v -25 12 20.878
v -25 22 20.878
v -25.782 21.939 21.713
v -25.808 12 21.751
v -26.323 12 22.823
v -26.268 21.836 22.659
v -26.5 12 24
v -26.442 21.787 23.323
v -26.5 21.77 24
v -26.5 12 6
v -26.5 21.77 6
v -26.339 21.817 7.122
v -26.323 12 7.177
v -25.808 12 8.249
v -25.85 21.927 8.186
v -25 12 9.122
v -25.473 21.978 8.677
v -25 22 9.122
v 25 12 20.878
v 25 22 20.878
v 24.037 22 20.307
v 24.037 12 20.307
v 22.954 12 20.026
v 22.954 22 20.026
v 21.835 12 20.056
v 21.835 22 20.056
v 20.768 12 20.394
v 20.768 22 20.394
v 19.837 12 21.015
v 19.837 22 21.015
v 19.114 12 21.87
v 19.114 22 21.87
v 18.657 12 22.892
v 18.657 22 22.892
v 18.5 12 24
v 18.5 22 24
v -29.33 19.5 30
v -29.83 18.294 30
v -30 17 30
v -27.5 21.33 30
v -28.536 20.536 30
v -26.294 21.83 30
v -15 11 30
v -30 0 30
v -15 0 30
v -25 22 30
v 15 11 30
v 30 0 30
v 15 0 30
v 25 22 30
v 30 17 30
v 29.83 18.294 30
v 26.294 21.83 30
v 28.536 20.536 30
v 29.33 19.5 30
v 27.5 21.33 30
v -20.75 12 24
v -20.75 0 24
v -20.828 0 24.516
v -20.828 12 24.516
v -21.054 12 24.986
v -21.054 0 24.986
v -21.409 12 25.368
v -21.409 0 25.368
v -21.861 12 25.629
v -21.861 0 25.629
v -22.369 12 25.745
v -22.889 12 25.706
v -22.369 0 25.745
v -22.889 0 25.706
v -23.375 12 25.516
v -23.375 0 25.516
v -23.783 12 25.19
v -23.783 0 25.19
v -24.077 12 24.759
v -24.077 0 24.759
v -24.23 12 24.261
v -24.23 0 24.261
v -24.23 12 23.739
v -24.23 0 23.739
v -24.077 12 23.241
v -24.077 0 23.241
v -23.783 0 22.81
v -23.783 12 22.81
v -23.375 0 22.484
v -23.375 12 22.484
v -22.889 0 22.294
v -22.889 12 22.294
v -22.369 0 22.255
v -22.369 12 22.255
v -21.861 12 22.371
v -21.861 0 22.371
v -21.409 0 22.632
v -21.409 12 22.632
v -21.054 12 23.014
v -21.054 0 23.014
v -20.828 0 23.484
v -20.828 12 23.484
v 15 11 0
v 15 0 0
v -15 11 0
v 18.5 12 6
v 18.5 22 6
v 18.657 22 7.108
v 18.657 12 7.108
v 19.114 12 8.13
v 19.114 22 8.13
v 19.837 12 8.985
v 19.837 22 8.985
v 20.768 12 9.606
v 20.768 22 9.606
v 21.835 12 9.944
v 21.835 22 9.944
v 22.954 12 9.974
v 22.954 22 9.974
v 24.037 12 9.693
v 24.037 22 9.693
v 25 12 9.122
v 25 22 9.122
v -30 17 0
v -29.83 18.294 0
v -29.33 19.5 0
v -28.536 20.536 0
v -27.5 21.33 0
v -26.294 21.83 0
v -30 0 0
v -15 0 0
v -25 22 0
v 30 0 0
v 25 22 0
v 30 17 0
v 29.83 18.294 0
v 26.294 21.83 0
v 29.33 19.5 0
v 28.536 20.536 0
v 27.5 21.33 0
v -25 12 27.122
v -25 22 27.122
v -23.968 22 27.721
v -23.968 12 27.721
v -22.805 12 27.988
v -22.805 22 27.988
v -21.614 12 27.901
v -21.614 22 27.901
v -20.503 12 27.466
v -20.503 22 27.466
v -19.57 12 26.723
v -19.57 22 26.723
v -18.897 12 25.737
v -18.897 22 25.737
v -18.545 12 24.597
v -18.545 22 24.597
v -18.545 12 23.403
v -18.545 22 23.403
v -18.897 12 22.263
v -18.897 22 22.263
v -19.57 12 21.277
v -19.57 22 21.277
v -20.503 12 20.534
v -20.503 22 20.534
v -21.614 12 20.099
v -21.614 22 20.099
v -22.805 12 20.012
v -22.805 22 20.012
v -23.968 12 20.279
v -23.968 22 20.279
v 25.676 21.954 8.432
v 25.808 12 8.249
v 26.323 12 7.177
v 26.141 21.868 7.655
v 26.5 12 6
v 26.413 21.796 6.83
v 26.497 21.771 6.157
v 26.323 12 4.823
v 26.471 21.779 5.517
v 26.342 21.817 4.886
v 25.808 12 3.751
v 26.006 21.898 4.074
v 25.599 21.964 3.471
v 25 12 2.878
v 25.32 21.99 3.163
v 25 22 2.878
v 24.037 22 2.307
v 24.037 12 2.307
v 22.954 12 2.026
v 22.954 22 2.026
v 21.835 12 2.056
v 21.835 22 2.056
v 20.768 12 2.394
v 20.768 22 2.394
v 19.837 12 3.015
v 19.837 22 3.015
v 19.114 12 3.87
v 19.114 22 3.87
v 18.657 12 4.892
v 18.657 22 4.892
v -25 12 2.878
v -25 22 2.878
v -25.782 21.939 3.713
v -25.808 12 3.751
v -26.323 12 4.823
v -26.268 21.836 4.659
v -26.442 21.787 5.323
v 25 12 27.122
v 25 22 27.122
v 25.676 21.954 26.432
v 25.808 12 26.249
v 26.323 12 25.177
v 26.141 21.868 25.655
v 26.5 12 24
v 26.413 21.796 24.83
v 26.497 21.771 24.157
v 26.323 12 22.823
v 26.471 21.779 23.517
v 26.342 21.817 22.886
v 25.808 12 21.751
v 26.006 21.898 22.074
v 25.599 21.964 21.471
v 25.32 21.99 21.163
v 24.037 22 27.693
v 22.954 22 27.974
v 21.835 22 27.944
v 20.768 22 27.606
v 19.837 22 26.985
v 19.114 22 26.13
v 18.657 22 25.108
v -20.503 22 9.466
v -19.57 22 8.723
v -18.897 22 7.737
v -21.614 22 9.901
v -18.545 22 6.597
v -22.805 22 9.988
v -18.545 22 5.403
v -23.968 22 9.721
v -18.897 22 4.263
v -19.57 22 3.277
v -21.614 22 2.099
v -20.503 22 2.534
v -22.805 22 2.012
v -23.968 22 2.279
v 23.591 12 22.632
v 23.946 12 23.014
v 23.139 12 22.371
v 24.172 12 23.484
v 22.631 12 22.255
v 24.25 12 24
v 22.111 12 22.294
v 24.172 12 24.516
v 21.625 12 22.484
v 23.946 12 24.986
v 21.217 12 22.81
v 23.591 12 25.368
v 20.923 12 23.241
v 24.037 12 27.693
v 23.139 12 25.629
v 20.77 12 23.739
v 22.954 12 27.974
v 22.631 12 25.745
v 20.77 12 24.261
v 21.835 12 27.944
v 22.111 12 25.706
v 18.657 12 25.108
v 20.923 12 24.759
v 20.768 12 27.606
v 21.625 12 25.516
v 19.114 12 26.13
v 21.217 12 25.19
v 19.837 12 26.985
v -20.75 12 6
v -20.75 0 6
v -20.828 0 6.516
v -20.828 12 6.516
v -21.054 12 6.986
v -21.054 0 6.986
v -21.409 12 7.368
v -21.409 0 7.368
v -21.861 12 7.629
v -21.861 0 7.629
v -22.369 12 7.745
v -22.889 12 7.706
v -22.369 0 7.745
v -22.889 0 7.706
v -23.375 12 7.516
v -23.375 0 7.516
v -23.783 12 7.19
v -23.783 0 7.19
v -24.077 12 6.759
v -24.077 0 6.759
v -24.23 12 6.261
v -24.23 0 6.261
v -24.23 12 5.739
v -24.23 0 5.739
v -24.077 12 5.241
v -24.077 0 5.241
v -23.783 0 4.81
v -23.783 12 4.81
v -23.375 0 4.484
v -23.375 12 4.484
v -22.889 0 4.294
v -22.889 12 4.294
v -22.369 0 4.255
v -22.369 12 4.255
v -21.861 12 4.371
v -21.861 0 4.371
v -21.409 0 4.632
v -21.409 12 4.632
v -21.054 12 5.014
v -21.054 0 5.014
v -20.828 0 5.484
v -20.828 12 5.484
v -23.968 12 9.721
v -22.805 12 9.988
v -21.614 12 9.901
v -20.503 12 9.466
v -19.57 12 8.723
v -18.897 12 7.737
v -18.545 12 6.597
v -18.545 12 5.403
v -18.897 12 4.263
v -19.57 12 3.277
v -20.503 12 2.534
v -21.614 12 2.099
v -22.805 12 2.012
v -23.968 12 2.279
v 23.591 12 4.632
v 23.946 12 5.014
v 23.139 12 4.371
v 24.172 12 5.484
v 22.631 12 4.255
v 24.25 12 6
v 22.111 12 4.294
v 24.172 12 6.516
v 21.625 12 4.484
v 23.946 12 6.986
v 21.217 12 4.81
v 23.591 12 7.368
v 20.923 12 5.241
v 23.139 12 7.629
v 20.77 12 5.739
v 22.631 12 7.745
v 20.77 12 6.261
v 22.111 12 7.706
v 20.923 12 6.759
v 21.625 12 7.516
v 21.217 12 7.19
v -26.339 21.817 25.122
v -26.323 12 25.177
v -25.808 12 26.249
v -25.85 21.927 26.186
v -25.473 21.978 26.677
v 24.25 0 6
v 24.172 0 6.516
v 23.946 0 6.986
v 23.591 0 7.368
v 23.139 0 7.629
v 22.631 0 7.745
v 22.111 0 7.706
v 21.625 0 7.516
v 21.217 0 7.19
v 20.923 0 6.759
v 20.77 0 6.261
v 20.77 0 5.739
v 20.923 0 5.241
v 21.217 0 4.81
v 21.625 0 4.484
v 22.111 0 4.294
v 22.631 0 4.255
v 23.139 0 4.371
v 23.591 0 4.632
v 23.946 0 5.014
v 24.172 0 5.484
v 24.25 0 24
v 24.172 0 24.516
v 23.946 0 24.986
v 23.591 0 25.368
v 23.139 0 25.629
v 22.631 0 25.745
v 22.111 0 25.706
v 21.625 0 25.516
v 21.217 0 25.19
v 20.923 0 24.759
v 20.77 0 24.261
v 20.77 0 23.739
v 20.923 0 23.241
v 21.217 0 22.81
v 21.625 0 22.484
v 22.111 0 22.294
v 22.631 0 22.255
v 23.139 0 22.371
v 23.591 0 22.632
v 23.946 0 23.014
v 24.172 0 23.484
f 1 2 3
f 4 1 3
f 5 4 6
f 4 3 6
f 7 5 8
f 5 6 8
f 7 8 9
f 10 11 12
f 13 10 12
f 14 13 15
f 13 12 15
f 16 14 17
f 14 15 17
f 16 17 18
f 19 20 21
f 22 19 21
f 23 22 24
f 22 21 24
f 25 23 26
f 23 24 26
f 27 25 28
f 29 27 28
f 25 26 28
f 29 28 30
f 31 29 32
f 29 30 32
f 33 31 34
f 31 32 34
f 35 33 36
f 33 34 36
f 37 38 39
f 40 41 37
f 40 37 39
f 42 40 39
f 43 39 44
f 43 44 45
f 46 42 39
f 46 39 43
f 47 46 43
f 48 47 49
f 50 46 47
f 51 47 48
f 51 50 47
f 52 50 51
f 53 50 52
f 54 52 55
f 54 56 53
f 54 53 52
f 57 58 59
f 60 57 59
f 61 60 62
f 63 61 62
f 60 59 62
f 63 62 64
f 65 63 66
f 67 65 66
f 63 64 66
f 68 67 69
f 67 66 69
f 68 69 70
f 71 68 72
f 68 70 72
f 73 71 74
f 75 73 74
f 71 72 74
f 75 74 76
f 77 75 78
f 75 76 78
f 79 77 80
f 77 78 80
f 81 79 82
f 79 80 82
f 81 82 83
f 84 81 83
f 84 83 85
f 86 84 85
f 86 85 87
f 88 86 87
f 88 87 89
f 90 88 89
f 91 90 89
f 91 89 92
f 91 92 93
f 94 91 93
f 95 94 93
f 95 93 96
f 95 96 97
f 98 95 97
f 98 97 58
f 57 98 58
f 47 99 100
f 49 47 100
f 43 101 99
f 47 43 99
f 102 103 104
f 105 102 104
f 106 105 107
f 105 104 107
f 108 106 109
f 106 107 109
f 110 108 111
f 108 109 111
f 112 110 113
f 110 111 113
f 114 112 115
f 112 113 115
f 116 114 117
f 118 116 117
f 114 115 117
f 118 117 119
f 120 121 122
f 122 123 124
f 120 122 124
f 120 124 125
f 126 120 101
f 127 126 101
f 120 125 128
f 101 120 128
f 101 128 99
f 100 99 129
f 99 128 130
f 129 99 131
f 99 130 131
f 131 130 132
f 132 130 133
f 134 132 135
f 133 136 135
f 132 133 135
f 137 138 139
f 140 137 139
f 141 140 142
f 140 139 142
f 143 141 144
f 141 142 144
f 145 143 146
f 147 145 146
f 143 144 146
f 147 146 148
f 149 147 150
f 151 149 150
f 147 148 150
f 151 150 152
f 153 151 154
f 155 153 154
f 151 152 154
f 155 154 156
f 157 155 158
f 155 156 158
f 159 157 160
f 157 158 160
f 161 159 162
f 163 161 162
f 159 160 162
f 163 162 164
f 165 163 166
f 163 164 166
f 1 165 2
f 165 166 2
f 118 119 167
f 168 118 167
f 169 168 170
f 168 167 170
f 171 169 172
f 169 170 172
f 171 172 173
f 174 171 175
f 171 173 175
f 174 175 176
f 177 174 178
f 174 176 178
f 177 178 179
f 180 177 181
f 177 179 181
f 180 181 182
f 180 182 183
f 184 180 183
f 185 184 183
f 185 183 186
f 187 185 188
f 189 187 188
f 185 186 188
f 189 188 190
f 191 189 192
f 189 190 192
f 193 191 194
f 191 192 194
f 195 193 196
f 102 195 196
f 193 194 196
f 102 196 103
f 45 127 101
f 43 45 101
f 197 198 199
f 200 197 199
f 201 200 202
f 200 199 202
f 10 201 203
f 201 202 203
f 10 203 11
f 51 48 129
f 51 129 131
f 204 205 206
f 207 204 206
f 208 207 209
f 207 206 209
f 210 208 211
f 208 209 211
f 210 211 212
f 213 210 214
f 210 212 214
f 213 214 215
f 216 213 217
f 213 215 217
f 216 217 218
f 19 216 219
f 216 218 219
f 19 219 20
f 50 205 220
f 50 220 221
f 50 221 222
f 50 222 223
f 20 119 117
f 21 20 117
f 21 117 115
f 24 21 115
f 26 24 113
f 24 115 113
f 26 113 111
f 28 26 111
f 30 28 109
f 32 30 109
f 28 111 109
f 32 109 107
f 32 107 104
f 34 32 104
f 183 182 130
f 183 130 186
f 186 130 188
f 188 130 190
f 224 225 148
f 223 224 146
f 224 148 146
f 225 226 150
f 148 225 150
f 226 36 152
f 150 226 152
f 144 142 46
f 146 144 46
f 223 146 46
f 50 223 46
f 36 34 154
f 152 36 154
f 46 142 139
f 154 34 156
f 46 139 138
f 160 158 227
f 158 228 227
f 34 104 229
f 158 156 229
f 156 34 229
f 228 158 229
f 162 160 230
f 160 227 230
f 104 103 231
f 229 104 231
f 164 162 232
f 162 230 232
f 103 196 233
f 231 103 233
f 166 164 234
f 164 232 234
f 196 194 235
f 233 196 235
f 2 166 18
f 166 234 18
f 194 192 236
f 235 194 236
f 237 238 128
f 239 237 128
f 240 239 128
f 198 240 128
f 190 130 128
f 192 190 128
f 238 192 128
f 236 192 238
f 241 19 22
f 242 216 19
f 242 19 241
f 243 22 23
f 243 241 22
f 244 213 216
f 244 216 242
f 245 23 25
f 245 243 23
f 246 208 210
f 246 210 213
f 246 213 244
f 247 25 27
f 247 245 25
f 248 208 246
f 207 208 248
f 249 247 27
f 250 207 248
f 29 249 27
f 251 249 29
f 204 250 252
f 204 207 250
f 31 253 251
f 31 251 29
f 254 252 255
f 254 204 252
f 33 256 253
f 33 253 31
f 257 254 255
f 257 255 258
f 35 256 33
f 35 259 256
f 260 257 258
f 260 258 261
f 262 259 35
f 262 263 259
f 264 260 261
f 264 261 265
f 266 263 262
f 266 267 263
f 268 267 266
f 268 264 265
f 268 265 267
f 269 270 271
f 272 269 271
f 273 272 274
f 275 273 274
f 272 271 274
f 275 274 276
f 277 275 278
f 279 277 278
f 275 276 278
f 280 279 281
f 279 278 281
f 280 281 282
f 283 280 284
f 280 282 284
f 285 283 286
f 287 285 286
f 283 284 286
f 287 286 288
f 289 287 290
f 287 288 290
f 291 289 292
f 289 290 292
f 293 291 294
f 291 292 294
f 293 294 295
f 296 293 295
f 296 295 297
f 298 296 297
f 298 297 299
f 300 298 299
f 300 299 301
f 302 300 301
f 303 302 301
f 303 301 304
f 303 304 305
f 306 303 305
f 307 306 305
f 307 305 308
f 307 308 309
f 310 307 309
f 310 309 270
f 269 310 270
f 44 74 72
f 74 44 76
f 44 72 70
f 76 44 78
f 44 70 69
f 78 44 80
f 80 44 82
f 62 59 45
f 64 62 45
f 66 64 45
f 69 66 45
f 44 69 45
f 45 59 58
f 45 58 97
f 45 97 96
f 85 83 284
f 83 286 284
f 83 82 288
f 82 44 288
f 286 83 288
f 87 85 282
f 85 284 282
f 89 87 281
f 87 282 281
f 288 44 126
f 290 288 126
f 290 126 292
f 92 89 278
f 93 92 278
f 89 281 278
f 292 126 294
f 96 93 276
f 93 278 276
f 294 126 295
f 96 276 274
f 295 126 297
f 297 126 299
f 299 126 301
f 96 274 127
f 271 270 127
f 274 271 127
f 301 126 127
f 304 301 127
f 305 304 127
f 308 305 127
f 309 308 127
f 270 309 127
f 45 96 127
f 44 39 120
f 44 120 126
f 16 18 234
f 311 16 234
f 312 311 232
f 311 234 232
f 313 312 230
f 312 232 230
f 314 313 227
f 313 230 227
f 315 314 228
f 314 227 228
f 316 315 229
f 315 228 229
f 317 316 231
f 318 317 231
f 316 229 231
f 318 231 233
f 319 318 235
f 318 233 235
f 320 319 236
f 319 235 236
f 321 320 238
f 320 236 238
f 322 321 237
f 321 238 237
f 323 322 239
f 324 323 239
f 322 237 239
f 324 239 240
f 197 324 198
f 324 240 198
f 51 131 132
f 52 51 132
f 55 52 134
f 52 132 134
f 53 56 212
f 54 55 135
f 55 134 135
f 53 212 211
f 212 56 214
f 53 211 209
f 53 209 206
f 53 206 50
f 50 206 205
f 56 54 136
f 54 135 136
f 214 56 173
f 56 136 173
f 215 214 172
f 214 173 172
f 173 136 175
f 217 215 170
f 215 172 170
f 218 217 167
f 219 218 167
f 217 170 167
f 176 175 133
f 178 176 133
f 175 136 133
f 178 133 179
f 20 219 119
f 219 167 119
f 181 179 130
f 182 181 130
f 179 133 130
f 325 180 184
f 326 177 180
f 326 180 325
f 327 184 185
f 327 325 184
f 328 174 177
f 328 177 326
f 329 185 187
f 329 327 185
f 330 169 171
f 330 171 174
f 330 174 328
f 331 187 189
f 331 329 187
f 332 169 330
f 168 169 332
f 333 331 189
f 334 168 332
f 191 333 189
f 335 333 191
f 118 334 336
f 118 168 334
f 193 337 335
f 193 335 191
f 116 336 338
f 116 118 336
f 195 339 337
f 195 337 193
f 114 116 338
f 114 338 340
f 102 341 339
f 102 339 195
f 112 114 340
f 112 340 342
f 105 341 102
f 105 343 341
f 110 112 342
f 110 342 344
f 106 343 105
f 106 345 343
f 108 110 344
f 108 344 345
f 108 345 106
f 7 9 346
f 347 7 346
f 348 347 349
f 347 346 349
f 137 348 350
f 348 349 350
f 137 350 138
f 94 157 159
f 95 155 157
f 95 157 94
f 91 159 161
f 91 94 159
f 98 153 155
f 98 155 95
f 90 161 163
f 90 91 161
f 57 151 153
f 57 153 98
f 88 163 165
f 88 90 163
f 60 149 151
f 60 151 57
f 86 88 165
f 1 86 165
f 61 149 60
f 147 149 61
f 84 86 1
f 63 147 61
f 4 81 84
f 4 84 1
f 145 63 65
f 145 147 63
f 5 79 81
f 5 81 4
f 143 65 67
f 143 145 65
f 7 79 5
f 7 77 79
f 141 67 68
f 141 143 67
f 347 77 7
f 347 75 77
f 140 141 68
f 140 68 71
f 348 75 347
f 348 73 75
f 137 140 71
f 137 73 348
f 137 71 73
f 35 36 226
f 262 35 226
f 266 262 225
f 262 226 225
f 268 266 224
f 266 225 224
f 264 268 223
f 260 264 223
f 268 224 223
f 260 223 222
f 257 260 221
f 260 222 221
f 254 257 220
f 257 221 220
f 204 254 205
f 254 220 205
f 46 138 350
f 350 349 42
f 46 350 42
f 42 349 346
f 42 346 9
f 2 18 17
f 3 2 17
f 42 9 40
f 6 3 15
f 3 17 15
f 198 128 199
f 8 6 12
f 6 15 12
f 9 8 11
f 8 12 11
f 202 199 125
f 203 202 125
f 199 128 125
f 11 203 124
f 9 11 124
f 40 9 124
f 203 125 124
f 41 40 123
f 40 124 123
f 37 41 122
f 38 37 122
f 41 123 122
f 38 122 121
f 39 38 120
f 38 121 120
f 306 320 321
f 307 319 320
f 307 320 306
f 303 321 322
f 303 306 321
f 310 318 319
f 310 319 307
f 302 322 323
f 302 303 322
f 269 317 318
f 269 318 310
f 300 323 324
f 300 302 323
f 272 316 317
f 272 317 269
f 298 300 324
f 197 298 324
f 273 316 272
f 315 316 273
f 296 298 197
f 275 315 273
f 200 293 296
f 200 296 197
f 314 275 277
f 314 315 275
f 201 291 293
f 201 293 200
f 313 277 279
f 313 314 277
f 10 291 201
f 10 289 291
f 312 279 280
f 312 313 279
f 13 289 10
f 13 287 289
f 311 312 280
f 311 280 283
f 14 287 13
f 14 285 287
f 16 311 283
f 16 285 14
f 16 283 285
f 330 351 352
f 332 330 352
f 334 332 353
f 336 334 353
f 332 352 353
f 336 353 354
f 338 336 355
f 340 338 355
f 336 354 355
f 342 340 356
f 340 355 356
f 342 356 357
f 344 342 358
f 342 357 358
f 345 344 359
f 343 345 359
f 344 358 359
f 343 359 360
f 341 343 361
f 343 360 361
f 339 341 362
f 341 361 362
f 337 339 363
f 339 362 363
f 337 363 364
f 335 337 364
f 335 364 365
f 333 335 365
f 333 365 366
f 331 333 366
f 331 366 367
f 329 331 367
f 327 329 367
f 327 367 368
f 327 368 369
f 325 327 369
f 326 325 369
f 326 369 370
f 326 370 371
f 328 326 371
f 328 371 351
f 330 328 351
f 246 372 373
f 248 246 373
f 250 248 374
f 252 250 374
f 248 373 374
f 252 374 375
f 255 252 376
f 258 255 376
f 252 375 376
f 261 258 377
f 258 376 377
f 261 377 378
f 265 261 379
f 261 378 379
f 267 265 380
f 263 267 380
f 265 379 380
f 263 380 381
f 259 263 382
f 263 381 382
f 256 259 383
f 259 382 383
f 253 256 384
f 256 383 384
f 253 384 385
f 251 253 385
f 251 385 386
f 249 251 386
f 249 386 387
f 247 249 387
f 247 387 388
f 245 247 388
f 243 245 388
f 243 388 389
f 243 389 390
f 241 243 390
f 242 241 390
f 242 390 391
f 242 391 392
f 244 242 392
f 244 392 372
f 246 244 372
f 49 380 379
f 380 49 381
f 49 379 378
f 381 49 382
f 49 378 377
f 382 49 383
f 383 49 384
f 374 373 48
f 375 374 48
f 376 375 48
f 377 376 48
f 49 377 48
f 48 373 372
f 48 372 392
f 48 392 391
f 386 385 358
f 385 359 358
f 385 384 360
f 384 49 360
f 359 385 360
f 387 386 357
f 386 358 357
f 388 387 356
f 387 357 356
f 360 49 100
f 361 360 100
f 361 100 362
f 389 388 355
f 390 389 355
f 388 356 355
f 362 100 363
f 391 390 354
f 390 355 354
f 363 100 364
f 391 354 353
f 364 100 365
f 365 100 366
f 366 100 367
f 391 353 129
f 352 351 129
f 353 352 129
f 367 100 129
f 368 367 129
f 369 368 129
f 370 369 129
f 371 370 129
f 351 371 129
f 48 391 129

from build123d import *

# Parameters (mm, degrees)
F1_DEPTH = 30
F2_R     = 1.75
F3_R     = 1.75
F4_DEPTH = 22.001
F5_R     = 1.75
F6_DEPTH = 10


with BuildPart() as f1:
    # F0 (on Top) → F1 (new body)
    with BuildSketch(Plane.XY):
        with BuildLine():
            Line((25, 22), (-25, 22))
            ThreePointArc((-25, 22), (-28.5355339059, 20.5355339059), (-30, 17))
            Line((-30, 17), (-30, 0))
            Line((-30, 0), (-15, 0))
            Line((-15, 0), (-15, 11))
            Line((-15, 11), (15, 11))
            Line((15, 11), (15, 0))
            Line((15, 0), (30, 0))
            Line((30, 0), (30, 17))
            ThreePointArc((30, 17), (28.5355339059, 20.5355339059), (25, 22))
        make_face()
    extrude(amount=F1_DEPTH)

    # F2 (on face) + F3 (on face) → F4 (cut, through all)
    with BuildSketch(Plane.XZ):
        with Locations((-22.5, 24)):
            Circle(F2_R)
        with Locations((-22.5, 6)):
            Circle(F2_R)
    with BuildSketch(Plane.XZ):
        with Locations((22.5, 6)):
            Circle(F3_R)
        with Locations((22.5, 24)):
            Circle(F3_R)
    extrude(amount=-F4_DEPTH, mode=Mode.SUBTRACT)

    # F5 (on face) → F6 (cut)
    with BuildSketch(Plane(origin=(0, 22, 0), x_dir=(-1, 0, 0), z_dir=(0, 1, 0))):
        with BuildLine():
            ThreePointArc((25, 20.8775010008), (26.1055512755, 22.2679491924), (26.5, 24))
            ThreePointArc((26.5, 24), (26.1055512755, 25.7320508076), (25, 27.1224989992))
            Line((25, 27.1224989992), (25, 20.8775010008))
        make_face()
        with BuildLine():
            Line((25, 20.8775010008), (25, 27.1224989992))
            ThreePointArc((25, 27.1224989992), (18.5, 24), (25, 20.8775010008))
        make_face()
        with Locations((22.5, 24)):
            Circle(F5_R, mode=Mode.SUBTRACT)
        with BuildLine():
            Line((25, 2.8775010008), (25, 9.1224989992))
            ThreePointArc((25, 9.1224989992), (18.5, 6), (25, 2.8775010008))
        make_face()
        with Locations((22.5, 6)):
            Circle(F5_R, mode=Mode.SUBTRACT)
        with BuildLine():
            ThreePointArc((26.5, 6), (26.1055512755, 7.7320508076), (25, 9.1224989992))
            Line((25, 9.1224989992), (25, 2.8775010008))
            ThreePointArc((25, 2.8775010008), (26.1055512755, 4.2679491924), (26.5, 6))
        make_face()
        with BuildLine():
            ThreePointArc((-18.5, 6), (-20.7679491924, 9.6055512755), (-25, 9.1224989992))
            Line((-25, 9.1224989992), (-25, 2.8775010008))
            ThreePointArc((-25, 2.8775010008), (-20.7679491924, 2.3944487245), (-18.5, 6))
        make_face()
        with Locations((-22.5, 6)):
            Circle(F5_R, mode=Mode.SUBTRACT)
        with BuildLine():
            Line((-25, 2.8775010008), (-25, 9.1224989992))
            ThreePointArc((-25, 9.1224989992), (-26.5, 6), (-25, 2.8775010008))
        make_face()
        with BuildLine():
            ThreePointArc((-18.5, 24), (-20.7679491924, 27.6055512755), (-25, 27.1224989992))
            Line((-25, 27.1224989992), (-25, 20.8775010008))
            ThreePointArc((-25, 20.8775010008), (-20.7679491924, 20.3944487245), (-18.5, 24))
        make_face()
        with Locations((-22.5, 24)):
            Circle(F5_R, mode=Mode.SUBTRACT)
        with BuildLine():
            Line((-25, 20.8775010008), (-25, 27.1224989992))
            ThreePointArc((-25, 27.1224989992), (-26.5, 24), (-25, 20.8775010008))
        make_face()
    extrude(amount=-F6_DEPTH, mode=Mode.SUBTRACT)


solid = f1.part
